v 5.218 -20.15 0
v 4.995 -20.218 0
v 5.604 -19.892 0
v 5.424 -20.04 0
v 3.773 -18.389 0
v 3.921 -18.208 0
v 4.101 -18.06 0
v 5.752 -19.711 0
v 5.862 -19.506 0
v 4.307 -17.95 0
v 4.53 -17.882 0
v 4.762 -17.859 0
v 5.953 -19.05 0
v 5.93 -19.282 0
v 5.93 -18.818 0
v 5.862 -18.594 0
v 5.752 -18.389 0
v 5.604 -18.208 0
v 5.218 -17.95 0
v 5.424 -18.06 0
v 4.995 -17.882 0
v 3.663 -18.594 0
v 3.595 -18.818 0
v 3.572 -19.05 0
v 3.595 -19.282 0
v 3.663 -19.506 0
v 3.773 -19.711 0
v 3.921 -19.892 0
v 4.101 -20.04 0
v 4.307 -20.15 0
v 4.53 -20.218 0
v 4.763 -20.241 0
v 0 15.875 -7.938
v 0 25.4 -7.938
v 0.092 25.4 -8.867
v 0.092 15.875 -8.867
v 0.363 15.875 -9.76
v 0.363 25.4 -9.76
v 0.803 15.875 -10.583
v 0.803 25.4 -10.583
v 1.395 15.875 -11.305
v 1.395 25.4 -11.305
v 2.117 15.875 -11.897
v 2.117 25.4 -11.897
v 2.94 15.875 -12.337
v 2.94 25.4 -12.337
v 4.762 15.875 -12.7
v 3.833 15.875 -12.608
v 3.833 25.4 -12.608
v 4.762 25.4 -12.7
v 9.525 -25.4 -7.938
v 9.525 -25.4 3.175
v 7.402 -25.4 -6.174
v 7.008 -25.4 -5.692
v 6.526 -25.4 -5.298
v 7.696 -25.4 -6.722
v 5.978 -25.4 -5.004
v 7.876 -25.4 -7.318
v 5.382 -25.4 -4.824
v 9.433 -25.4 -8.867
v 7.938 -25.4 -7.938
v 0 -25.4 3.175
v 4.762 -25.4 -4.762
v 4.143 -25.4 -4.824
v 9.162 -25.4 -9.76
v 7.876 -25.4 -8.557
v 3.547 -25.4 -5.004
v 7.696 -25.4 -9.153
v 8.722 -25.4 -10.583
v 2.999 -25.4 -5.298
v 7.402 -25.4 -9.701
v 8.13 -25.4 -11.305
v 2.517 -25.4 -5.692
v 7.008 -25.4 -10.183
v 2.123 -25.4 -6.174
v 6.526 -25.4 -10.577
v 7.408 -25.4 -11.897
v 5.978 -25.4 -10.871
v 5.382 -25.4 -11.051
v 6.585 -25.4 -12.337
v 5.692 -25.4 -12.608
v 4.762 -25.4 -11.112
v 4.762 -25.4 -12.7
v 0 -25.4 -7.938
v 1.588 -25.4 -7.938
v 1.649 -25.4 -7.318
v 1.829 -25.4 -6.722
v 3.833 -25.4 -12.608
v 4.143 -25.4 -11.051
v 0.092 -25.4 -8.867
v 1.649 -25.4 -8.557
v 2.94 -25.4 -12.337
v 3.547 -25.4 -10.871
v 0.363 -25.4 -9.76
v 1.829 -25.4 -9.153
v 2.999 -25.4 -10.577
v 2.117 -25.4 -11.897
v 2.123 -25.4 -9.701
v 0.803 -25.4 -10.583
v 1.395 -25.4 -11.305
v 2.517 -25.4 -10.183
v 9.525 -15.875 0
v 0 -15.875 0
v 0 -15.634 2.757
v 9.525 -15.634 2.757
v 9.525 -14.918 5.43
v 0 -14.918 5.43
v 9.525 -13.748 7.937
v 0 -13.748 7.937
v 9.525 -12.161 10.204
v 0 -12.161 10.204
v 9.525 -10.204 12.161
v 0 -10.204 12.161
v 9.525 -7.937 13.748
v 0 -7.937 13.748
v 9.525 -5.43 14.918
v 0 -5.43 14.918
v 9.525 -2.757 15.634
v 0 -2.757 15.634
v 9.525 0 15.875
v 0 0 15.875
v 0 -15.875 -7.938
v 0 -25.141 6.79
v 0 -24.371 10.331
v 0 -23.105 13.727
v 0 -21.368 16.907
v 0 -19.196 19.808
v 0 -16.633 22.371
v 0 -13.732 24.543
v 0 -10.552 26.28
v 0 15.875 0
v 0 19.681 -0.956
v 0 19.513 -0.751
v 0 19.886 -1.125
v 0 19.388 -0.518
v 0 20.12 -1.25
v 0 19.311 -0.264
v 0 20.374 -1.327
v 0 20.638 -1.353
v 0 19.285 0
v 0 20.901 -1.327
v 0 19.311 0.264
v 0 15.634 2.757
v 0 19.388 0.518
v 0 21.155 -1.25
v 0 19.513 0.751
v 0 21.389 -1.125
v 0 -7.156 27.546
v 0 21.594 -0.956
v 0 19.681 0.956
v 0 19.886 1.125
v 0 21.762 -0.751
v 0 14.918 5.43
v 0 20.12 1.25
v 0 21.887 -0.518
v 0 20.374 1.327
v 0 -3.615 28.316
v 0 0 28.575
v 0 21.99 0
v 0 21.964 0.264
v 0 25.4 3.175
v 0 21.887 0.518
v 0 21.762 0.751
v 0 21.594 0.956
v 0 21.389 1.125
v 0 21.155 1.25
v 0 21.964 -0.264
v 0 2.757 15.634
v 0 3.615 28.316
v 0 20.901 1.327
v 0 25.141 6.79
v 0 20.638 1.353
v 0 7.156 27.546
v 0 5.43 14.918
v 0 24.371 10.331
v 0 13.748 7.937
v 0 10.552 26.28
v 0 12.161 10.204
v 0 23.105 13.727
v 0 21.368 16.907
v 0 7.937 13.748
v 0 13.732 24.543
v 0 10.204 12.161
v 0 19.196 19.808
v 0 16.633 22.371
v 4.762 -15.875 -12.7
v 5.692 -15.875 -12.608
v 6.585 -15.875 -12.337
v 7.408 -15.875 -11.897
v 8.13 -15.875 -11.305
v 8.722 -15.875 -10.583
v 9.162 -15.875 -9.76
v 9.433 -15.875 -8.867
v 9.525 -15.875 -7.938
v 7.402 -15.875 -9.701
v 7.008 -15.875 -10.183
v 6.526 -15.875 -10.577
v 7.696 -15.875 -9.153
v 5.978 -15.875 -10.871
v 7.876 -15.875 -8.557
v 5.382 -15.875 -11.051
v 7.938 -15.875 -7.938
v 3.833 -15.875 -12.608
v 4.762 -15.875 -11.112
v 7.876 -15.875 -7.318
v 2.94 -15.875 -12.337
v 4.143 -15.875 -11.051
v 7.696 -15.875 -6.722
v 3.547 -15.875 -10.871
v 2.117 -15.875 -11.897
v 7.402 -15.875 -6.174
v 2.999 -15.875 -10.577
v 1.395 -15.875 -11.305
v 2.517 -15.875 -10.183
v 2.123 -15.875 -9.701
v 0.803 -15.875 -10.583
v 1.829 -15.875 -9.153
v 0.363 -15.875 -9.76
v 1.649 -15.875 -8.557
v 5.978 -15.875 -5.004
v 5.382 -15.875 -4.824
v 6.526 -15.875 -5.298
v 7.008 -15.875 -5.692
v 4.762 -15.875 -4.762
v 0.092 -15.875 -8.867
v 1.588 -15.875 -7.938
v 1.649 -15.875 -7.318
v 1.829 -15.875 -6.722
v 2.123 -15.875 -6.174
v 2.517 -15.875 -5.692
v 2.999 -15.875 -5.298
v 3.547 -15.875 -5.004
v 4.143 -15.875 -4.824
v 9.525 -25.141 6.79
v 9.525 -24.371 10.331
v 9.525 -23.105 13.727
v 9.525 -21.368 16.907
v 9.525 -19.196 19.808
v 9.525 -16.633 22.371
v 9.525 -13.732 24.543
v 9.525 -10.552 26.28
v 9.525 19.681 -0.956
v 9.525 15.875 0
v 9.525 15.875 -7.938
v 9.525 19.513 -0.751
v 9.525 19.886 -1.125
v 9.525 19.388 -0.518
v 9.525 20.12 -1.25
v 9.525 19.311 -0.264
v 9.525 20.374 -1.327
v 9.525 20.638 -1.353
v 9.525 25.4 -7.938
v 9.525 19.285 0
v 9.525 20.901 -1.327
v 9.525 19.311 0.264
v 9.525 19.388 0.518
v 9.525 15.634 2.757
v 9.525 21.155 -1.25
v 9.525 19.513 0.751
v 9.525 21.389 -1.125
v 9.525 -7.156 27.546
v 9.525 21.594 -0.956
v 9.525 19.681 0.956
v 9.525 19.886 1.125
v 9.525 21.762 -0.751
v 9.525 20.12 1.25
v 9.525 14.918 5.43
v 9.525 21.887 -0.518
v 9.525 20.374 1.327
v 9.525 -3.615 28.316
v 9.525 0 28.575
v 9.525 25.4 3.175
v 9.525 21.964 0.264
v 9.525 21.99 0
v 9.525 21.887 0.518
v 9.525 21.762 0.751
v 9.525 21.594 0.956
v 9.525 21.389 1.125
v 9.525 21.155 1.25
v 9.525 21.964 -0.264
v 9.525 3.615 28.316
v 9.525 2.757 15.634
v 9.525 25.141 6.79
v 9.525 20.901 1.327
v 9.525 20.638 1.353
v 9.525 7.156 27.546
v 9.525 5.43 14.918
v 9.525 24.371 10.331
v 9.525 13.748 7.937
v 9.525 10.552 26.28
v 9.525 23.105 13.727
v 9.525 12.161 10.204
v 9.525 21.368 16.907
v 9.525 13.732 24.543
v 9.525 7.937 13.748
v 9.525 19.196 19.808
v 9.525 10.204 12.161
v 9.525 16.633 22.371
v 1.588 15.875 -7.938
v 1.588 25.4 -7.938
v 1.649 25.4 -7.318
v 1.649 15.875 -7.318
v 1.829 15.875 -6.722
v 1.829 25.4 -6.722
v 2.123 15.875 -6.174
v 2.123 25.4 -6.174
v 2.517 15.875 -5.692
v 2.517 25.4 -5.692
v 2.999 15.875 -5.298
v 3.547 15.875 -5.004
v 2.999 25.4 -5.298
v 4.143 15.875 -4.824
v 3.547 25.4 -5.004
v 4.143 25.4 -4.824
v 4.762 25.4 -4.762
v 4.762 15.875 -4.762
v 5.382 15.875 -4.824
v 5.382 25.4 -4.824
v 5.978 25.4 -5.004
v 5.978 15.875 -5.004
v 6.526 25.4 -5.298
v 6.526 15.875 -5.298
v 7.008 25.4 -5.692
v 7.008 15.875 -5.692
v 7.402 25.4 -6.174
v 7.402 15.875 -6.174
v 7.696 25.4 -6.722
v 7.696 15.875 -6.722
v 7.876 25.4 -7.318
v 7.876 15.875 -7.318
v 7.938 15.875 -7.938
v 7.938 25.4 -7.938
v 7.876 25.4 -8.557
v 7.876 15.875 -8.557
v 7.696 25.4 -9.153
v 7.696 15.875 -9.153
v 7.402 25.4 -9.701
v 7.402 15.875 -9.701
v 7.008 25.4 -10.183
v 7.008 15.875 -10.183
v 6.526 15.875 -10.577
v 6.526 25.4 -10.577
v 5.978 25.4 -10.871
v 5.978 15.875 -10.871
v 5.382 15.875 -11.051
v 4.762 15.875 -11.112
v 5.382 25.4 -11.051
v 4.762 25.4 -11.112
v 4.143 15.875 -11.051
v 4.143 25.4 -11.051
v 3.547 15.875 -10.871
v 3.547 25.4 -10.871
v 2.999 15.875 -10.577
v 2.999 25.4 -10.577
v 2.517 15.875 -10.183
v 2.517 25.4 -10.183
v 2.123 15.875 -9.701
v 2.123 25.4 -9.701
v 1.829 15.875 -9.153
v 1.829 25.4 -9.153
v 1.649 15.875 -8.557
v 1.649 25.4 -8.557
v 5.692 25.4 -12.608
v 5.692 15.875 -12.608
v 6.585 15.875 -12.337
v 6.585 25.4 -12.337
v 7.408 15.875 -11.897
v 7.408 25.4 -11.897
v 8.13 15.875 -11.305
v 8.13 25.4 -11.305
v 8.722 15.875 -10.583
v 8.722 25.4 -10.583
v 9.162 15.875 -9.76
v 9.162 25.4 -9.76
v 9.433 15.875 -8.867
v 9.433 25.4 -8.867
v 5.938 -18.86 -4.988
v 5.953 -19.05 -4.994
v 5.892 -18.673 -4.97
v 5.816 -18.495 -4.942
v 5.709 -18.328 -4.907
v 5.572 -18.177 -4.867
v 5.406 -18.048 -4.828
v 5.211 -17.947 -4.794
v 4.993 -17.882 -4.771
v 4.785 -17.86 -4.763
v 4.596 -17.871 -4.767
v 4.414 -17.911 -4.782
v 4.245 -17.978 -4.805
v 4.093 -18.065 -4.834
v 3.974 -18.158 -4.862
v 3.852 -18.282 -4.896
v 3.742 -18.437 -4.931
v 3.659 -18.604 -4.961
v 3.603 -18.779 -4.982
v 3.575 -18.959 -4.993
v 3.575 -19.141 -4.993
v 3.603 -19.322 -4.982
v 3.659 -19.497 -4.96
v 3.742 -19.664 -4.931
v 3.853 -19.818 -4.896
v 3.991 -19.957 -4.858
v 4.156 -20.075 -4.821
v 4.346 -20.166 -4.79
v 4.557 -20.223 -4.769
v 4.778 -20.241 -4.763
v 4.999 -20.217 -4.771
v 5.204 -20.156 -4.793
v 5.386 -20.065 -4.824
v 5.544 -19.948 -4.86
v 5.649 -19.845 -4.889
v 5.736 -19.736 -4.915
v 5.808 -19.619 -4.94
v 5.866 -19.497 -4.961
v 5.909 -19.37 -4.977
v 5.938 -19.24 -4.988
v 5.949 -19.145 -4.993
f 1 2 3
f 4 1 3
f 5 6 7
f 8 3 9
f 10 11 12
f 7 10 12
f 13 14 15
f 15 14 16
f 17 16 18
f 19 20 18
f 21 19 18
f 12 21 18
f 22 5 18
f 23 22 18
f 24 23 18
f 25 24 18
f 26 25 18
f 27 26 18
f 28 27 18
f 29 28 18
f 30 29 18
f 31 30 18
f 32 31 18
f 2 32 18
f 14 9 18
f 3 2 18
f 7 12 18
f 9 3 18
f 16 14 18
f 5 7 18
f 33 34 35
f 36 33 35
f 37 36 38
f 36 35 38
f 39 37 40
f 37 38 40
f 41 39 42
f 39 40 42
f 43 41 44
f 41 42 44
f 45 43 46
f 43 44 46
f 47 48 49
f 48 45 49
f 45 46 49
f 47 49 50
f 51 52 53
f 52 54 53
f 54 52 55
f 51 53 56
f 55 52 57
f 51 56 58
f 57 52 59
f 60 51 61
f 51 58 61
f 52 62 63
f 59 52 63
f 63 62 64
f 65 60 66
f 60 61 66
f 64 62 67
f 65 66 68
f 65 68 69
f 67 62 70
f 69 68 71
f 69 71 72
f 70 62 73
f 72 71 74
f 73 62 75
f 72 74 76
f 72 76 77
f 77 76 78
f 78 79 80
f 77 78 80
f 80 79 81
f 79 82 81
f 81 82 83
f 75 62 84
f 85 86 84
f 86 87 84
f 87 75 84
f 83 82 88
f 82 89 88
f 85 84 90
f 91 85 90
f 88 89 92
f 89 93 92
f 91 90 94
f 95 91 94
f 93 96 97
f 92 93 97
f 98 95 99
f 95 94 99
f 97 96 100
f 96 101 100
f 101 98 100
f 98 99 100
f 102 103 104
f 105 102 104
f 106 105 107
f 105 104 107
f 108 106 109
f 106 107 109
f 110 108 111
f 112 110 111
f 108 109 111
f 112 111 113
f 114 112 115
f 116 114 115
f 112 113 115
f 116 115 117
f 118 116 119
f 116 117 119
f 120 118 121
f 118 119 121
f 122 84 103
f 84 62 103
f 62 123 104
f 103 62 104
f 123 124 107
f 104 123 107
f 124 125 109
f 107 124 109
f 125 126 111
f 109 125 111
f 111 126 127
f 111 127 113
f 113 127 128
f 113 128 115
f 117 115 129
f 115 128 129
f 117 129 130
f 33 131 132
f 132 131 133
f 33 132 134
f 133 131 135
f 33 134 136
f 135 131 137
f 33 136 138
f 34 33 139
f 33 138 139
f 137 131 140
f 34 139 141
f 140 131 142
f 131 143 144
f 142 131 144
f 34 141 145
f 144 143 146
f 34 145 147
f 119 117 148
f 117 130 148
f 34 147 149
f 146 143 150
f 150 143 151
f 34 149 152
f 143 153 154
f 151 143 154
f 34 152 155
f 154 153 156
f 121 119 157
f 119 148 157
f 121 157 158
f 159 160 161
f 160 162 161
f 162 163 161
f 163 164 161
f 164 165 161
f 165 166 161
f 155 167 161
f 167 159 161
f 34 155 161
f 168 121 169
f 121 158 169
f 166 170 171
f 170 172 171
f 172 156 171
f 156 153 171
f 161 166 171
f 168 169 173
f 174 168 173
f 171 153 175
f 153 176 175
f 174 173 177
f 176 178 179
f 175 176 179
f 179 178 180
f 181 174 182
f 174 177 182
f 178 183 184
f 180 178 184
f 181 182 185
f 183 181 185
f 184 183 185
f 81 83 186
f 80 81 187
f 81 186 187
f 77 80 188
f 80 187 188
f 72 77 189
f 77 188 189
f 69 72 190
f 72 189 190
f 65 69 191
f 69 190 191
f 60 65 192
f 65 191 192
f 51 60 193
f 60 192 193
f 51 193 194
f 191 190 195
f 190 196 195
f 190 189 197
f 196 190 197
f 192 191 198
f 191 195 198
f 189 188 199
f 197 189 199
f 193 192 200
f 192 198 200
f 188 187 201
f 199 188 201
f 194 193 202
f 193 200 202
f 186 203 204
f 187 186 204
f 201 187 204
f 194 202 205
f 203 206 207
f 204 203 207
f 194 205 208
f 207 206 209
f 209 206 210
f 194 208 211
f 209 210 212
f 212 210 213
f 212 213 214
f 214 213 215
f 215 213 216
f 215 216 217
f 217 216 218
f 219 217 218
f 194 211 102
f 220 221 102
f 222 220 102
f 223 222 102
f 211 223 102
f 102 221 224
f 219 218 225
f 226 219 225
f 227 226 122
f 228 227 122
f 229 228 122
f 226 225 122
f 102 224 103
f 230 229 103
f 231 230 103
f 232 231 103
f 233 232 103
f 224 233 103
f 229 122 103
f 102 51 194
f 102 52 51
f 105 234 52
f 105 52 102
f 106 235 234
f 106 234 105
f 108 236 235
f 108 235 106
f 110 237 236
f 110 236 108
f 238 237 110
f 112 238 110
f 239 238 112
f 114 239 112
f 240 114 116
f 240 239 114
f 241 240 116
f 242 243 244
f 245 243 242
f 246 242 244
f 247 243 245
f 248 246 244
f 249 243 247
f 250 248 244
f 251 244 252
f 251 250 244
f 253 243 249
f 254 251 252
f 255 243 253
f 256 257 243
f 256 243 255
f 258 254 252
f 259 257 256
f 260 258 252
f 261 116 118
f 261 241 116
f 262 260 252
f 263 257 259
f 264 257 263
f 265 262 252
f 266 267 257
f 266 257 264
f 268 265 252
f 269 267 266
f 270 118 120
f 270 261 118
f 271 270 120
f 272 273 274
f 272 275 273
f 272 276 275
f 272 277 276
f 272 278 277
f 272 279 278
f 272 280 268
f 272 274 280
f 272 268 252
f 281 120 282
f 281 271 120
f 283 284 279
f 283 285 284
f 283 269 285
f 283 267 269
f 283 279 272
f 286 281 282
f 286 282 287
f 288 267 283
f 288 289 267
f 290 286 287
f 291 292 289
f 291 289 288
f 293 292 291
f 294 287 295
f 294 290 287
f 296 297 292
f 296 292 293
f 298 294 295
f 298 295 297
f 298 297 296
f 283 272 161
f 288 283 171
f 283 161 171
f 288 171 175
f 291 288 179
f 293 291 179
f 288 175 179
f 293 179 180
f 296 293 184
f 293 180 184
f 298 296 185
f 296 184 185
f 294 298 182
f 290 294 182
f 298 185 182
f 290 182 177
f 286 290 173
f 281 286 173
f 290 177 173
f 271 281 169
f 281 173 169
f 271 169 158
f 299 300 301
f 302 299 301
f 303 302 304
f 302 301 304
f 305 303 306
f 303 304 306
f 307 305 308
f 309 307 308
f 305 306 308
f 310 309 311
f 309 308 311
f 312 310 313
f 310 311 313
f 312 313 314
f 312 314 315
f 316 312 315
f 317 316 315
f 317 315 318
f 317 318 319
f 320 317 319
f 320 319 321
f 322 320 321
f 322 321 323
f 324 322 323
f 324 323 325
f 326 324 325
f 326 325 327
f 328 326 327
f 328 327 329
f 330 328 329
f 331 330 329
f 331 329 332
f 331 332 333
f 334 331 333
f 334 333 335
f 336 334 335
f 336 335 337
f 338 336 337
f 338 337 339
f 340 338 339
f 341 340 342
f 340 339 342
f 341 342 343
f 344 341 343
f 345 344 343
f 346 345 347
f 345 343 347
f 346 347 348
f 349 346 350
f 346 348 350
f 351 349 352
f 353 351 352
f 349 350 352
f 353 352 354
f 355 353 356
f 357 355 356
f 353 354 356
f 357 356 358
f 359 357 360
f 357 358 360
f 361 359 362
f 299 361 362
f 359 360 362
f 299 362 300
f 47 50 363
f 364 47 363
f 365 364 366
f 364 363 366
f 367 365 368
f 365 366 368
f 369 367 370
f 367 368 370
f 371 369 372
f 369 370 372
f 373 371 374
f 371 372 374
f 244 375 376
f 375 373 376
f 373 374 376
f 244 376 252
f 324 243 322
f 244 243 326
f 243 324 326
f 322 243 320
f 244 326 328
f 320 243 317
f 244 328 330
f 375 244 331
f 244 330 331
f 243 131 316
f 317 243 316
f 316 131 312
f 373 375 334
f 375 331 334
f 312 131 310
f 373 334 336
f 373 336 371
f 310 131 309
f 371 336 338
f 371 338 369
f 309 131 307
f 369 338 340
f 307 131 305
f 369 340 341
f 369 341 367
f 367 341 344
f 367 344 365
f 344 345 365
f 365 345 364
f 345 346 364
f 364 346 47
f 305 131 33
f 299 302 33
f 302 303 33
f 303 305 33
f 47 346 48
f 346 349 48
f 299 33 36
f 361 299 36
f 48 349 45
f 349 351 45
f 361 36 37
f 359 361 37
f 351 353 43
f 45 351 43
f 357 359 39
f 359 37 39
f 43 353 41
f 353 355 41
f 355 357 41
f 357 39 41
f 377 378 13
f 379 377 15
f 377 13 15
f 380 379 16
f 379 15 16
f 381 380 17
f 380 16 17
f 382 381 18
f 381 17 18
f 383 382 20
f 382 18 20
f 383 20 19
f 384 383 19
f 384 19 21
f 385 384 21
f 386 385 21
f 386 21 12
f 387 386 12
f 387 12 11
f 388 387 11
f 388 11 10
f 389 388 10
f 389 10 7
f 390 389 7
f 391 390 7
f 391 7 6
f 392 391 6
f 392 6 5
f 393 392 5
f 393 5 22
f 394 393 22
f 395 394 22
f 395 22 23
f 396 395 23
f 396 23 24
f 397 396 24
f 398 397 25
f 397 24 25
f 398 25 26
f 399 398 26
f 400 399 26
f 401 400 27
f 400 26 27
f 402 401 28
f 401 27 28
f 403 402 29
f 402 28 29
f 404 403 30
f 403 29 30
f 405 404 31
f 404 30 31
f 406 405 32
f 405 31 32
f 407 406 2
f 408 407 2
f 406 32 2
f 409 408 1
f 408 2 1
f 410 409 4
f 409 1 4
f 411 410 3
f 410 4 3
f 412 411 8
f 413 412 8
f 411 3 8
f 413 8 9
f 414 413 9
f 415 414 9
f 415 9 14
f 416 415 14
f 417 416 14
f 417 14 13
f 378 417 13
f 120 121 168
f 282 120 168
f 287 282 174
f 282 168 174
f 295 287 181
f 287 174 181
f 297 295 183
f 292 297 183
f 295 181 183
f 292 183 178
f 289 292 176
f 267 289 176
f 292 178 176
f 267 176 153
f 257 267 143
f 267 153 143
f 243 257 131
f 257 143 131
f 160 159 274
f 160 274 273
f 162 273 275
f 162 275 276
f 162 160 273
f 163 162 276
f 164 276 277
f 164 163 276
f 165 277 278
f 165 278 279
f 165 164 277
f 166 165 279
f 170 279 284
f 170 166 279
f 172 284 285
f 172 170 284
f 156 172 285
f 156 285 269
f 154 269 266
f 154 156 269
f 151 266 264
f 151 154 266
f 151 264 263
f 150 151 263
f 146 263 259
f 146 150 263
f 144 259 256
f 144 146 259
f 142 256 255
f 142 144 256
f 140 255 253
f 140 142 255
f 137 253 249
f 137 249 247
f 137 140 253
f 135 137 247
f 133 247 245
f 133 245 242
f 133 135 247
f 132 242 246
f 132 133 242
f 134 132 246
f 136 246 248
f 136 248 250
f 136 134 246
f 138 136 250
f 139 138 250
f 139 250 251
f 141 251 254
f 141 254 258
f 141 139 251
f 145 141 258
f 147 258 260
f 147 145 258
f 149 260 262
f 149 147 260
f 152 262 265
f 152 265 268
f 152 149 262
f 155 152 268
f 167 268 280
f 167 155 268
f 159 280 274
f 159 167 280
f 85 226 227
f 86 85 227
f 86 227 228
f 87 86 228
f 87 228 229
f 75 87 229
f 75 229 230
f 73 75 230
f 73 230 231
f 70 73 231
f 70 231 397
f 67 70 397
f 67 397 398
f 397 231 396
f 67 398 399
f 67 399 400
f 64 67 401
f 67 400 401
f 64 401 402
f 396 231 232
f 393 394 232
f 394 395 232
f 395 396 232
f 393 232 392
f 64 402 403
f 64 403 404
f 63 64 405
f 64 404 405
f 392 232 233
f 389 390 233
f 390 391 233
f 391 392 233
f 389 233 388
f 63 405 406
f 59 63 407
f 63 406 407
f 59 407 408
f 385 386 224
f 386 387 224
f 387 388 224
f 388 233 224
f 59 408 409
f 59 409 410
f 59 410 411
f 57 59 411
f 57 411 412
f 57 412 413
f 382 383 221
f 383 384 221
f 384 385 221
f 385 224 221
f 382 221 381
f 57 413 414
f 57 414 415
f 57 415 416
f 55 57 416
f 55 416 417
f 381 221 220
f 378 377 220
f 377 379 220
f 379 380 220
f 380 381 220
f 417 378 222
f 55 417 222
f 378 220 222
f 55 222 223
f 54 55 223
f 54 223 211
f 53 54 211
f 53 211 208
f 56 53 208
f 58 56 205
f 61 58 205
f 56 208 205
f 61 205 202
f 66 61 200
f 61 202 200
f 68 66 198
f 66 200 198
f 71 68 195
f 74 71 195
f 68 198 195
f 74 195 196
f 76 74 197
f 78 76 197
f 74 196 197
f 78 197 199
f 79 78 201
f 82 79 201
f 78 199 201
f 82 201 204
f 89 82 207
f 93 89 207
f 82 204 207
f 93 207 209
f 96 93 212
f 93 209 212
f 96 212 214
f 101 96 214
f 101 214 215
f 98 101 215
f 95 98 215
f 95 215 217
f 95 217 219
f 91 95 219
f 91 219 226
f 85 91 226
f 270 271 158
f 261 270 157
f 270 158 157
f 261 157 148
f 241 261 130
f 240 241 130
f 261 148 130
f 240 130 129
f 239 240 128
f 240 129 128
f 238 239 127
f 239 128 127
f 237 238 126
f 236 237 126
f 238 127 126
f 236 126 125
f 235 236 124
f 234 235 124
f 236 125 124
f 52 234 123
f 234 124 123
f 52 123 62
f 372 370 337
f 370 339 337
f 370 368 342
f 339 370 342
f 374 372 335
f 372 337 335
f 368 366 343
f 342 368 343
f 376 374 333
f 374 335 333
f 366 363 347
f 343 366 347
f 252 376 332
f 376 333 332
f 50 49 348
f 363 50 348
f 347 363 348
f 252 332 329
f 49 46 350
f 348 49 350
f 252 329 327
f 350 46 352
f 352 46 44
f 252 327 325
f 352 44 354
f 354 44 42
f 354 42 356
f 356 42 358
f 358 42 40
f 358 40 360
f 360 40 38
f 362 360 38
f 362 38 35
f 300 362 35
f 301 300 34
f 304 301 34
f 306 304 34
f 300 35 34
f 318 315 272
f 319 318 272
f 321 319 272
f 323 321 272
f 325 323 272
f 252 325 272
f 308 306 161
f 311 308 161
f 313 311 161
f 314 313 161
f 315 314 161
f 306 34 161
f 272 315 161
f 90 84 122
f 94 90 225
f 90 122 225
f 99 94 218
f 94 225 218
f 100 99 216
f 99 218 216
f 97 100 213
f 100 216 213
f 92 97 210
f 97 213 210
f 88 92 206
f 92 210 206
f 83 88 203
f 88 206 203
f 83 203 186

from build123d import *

# Parameters (mm, degrees)
F0_R     = 1.35255
F1_DEPTH = 9.525
F2_R     = 3.175
F3_DEPTH = 50.8
F4_R     = 1.190625
F5_DEPTH = 6.35


# Not quite as in the source:
# - a feature names something its author has since deleted; it is built from what else it names


with BuildPart() as f1:
    # F0 (on Right) → F1 (new body)
    with BuildSketch(Plane.YZ):
        with BuildLine():
            Line((-15.875, -12.7), (-15.875, 0))
            ThreePointArc((-15.875, 0), (-11.2253201513, 11.2253201513), (0, 15.875))
            ThreePointArc((0, 15.875), (11.2253201513, 11.2253201513), (15.875, 0))
            Line((15.875, 0), (15.875, -12.7))
            Line((15.875, -12.7), (25.4, -12.7))
            Line((25.4, -12.7), (25.4, 0))
            Line((25.4, 0), (25.4, 3.175))
            ThreePointArc((25.4, 3.175), (17.9605122421, 21.1355122421), (0, 28.575))
            ThreePointArc((0, 28.575), (-17.9605122421, 21.1355122421), (-25.4, 3.175))
            Line((-25.4, 3.175), (-25.4, 0))
            Line((-25.4, 0), (-25.4, -12.7))
            Line((-25.4, -12.7), (-15.875, -12.7))
        make_face()
        with Locations((20.6375, 0)):
            Circle(F0_R, mode=Mode.SUBTRACT)
    extrude(amount=F1_DEPTH)

    # F2 (on face) → F3 (cut)
    with BuildSketch(Plane(origin=(0, 25.4, 0), x_dir=(-1, 0, 0), z_dir=(0, 1, 0))):
        with Locations((-4.7625, -7.9375)):
            Circle(F2_R)
        with BuildLine():
            ThreePointArc((-4.7625, -12.7), (-8.1300960454, -11.3050960454), (-9.525, -7.9375))
            Line((-9.525, -7.9375), (-9.525, -12.7))
            Line((-9.525, -12.7), (-4.7625, -12.7))
        make_face()
        with BuildLine():
            ThreePointArc((0, -7.9375), (-1.3949039546, -11.3050960454), (-4.7625, -12.7))
            Line((-4.7625, -12.7), (0, -12.7))
            Line((0, -12.7), (0, -7.9375))
        make_face()
    extrude(amount=-F3_DEPTH, mode=Mode.SUBTRACT)

    # F4 (on Top) → F5 (cut)
    with BuildSketch(Plane.XY):
        with Locations((4.7625, -19.05)):
            Circle(F4_R)
    extrude(amount=-F5_DEPTH, mode=Mode.SUBTRACT)


solid = f1.part
